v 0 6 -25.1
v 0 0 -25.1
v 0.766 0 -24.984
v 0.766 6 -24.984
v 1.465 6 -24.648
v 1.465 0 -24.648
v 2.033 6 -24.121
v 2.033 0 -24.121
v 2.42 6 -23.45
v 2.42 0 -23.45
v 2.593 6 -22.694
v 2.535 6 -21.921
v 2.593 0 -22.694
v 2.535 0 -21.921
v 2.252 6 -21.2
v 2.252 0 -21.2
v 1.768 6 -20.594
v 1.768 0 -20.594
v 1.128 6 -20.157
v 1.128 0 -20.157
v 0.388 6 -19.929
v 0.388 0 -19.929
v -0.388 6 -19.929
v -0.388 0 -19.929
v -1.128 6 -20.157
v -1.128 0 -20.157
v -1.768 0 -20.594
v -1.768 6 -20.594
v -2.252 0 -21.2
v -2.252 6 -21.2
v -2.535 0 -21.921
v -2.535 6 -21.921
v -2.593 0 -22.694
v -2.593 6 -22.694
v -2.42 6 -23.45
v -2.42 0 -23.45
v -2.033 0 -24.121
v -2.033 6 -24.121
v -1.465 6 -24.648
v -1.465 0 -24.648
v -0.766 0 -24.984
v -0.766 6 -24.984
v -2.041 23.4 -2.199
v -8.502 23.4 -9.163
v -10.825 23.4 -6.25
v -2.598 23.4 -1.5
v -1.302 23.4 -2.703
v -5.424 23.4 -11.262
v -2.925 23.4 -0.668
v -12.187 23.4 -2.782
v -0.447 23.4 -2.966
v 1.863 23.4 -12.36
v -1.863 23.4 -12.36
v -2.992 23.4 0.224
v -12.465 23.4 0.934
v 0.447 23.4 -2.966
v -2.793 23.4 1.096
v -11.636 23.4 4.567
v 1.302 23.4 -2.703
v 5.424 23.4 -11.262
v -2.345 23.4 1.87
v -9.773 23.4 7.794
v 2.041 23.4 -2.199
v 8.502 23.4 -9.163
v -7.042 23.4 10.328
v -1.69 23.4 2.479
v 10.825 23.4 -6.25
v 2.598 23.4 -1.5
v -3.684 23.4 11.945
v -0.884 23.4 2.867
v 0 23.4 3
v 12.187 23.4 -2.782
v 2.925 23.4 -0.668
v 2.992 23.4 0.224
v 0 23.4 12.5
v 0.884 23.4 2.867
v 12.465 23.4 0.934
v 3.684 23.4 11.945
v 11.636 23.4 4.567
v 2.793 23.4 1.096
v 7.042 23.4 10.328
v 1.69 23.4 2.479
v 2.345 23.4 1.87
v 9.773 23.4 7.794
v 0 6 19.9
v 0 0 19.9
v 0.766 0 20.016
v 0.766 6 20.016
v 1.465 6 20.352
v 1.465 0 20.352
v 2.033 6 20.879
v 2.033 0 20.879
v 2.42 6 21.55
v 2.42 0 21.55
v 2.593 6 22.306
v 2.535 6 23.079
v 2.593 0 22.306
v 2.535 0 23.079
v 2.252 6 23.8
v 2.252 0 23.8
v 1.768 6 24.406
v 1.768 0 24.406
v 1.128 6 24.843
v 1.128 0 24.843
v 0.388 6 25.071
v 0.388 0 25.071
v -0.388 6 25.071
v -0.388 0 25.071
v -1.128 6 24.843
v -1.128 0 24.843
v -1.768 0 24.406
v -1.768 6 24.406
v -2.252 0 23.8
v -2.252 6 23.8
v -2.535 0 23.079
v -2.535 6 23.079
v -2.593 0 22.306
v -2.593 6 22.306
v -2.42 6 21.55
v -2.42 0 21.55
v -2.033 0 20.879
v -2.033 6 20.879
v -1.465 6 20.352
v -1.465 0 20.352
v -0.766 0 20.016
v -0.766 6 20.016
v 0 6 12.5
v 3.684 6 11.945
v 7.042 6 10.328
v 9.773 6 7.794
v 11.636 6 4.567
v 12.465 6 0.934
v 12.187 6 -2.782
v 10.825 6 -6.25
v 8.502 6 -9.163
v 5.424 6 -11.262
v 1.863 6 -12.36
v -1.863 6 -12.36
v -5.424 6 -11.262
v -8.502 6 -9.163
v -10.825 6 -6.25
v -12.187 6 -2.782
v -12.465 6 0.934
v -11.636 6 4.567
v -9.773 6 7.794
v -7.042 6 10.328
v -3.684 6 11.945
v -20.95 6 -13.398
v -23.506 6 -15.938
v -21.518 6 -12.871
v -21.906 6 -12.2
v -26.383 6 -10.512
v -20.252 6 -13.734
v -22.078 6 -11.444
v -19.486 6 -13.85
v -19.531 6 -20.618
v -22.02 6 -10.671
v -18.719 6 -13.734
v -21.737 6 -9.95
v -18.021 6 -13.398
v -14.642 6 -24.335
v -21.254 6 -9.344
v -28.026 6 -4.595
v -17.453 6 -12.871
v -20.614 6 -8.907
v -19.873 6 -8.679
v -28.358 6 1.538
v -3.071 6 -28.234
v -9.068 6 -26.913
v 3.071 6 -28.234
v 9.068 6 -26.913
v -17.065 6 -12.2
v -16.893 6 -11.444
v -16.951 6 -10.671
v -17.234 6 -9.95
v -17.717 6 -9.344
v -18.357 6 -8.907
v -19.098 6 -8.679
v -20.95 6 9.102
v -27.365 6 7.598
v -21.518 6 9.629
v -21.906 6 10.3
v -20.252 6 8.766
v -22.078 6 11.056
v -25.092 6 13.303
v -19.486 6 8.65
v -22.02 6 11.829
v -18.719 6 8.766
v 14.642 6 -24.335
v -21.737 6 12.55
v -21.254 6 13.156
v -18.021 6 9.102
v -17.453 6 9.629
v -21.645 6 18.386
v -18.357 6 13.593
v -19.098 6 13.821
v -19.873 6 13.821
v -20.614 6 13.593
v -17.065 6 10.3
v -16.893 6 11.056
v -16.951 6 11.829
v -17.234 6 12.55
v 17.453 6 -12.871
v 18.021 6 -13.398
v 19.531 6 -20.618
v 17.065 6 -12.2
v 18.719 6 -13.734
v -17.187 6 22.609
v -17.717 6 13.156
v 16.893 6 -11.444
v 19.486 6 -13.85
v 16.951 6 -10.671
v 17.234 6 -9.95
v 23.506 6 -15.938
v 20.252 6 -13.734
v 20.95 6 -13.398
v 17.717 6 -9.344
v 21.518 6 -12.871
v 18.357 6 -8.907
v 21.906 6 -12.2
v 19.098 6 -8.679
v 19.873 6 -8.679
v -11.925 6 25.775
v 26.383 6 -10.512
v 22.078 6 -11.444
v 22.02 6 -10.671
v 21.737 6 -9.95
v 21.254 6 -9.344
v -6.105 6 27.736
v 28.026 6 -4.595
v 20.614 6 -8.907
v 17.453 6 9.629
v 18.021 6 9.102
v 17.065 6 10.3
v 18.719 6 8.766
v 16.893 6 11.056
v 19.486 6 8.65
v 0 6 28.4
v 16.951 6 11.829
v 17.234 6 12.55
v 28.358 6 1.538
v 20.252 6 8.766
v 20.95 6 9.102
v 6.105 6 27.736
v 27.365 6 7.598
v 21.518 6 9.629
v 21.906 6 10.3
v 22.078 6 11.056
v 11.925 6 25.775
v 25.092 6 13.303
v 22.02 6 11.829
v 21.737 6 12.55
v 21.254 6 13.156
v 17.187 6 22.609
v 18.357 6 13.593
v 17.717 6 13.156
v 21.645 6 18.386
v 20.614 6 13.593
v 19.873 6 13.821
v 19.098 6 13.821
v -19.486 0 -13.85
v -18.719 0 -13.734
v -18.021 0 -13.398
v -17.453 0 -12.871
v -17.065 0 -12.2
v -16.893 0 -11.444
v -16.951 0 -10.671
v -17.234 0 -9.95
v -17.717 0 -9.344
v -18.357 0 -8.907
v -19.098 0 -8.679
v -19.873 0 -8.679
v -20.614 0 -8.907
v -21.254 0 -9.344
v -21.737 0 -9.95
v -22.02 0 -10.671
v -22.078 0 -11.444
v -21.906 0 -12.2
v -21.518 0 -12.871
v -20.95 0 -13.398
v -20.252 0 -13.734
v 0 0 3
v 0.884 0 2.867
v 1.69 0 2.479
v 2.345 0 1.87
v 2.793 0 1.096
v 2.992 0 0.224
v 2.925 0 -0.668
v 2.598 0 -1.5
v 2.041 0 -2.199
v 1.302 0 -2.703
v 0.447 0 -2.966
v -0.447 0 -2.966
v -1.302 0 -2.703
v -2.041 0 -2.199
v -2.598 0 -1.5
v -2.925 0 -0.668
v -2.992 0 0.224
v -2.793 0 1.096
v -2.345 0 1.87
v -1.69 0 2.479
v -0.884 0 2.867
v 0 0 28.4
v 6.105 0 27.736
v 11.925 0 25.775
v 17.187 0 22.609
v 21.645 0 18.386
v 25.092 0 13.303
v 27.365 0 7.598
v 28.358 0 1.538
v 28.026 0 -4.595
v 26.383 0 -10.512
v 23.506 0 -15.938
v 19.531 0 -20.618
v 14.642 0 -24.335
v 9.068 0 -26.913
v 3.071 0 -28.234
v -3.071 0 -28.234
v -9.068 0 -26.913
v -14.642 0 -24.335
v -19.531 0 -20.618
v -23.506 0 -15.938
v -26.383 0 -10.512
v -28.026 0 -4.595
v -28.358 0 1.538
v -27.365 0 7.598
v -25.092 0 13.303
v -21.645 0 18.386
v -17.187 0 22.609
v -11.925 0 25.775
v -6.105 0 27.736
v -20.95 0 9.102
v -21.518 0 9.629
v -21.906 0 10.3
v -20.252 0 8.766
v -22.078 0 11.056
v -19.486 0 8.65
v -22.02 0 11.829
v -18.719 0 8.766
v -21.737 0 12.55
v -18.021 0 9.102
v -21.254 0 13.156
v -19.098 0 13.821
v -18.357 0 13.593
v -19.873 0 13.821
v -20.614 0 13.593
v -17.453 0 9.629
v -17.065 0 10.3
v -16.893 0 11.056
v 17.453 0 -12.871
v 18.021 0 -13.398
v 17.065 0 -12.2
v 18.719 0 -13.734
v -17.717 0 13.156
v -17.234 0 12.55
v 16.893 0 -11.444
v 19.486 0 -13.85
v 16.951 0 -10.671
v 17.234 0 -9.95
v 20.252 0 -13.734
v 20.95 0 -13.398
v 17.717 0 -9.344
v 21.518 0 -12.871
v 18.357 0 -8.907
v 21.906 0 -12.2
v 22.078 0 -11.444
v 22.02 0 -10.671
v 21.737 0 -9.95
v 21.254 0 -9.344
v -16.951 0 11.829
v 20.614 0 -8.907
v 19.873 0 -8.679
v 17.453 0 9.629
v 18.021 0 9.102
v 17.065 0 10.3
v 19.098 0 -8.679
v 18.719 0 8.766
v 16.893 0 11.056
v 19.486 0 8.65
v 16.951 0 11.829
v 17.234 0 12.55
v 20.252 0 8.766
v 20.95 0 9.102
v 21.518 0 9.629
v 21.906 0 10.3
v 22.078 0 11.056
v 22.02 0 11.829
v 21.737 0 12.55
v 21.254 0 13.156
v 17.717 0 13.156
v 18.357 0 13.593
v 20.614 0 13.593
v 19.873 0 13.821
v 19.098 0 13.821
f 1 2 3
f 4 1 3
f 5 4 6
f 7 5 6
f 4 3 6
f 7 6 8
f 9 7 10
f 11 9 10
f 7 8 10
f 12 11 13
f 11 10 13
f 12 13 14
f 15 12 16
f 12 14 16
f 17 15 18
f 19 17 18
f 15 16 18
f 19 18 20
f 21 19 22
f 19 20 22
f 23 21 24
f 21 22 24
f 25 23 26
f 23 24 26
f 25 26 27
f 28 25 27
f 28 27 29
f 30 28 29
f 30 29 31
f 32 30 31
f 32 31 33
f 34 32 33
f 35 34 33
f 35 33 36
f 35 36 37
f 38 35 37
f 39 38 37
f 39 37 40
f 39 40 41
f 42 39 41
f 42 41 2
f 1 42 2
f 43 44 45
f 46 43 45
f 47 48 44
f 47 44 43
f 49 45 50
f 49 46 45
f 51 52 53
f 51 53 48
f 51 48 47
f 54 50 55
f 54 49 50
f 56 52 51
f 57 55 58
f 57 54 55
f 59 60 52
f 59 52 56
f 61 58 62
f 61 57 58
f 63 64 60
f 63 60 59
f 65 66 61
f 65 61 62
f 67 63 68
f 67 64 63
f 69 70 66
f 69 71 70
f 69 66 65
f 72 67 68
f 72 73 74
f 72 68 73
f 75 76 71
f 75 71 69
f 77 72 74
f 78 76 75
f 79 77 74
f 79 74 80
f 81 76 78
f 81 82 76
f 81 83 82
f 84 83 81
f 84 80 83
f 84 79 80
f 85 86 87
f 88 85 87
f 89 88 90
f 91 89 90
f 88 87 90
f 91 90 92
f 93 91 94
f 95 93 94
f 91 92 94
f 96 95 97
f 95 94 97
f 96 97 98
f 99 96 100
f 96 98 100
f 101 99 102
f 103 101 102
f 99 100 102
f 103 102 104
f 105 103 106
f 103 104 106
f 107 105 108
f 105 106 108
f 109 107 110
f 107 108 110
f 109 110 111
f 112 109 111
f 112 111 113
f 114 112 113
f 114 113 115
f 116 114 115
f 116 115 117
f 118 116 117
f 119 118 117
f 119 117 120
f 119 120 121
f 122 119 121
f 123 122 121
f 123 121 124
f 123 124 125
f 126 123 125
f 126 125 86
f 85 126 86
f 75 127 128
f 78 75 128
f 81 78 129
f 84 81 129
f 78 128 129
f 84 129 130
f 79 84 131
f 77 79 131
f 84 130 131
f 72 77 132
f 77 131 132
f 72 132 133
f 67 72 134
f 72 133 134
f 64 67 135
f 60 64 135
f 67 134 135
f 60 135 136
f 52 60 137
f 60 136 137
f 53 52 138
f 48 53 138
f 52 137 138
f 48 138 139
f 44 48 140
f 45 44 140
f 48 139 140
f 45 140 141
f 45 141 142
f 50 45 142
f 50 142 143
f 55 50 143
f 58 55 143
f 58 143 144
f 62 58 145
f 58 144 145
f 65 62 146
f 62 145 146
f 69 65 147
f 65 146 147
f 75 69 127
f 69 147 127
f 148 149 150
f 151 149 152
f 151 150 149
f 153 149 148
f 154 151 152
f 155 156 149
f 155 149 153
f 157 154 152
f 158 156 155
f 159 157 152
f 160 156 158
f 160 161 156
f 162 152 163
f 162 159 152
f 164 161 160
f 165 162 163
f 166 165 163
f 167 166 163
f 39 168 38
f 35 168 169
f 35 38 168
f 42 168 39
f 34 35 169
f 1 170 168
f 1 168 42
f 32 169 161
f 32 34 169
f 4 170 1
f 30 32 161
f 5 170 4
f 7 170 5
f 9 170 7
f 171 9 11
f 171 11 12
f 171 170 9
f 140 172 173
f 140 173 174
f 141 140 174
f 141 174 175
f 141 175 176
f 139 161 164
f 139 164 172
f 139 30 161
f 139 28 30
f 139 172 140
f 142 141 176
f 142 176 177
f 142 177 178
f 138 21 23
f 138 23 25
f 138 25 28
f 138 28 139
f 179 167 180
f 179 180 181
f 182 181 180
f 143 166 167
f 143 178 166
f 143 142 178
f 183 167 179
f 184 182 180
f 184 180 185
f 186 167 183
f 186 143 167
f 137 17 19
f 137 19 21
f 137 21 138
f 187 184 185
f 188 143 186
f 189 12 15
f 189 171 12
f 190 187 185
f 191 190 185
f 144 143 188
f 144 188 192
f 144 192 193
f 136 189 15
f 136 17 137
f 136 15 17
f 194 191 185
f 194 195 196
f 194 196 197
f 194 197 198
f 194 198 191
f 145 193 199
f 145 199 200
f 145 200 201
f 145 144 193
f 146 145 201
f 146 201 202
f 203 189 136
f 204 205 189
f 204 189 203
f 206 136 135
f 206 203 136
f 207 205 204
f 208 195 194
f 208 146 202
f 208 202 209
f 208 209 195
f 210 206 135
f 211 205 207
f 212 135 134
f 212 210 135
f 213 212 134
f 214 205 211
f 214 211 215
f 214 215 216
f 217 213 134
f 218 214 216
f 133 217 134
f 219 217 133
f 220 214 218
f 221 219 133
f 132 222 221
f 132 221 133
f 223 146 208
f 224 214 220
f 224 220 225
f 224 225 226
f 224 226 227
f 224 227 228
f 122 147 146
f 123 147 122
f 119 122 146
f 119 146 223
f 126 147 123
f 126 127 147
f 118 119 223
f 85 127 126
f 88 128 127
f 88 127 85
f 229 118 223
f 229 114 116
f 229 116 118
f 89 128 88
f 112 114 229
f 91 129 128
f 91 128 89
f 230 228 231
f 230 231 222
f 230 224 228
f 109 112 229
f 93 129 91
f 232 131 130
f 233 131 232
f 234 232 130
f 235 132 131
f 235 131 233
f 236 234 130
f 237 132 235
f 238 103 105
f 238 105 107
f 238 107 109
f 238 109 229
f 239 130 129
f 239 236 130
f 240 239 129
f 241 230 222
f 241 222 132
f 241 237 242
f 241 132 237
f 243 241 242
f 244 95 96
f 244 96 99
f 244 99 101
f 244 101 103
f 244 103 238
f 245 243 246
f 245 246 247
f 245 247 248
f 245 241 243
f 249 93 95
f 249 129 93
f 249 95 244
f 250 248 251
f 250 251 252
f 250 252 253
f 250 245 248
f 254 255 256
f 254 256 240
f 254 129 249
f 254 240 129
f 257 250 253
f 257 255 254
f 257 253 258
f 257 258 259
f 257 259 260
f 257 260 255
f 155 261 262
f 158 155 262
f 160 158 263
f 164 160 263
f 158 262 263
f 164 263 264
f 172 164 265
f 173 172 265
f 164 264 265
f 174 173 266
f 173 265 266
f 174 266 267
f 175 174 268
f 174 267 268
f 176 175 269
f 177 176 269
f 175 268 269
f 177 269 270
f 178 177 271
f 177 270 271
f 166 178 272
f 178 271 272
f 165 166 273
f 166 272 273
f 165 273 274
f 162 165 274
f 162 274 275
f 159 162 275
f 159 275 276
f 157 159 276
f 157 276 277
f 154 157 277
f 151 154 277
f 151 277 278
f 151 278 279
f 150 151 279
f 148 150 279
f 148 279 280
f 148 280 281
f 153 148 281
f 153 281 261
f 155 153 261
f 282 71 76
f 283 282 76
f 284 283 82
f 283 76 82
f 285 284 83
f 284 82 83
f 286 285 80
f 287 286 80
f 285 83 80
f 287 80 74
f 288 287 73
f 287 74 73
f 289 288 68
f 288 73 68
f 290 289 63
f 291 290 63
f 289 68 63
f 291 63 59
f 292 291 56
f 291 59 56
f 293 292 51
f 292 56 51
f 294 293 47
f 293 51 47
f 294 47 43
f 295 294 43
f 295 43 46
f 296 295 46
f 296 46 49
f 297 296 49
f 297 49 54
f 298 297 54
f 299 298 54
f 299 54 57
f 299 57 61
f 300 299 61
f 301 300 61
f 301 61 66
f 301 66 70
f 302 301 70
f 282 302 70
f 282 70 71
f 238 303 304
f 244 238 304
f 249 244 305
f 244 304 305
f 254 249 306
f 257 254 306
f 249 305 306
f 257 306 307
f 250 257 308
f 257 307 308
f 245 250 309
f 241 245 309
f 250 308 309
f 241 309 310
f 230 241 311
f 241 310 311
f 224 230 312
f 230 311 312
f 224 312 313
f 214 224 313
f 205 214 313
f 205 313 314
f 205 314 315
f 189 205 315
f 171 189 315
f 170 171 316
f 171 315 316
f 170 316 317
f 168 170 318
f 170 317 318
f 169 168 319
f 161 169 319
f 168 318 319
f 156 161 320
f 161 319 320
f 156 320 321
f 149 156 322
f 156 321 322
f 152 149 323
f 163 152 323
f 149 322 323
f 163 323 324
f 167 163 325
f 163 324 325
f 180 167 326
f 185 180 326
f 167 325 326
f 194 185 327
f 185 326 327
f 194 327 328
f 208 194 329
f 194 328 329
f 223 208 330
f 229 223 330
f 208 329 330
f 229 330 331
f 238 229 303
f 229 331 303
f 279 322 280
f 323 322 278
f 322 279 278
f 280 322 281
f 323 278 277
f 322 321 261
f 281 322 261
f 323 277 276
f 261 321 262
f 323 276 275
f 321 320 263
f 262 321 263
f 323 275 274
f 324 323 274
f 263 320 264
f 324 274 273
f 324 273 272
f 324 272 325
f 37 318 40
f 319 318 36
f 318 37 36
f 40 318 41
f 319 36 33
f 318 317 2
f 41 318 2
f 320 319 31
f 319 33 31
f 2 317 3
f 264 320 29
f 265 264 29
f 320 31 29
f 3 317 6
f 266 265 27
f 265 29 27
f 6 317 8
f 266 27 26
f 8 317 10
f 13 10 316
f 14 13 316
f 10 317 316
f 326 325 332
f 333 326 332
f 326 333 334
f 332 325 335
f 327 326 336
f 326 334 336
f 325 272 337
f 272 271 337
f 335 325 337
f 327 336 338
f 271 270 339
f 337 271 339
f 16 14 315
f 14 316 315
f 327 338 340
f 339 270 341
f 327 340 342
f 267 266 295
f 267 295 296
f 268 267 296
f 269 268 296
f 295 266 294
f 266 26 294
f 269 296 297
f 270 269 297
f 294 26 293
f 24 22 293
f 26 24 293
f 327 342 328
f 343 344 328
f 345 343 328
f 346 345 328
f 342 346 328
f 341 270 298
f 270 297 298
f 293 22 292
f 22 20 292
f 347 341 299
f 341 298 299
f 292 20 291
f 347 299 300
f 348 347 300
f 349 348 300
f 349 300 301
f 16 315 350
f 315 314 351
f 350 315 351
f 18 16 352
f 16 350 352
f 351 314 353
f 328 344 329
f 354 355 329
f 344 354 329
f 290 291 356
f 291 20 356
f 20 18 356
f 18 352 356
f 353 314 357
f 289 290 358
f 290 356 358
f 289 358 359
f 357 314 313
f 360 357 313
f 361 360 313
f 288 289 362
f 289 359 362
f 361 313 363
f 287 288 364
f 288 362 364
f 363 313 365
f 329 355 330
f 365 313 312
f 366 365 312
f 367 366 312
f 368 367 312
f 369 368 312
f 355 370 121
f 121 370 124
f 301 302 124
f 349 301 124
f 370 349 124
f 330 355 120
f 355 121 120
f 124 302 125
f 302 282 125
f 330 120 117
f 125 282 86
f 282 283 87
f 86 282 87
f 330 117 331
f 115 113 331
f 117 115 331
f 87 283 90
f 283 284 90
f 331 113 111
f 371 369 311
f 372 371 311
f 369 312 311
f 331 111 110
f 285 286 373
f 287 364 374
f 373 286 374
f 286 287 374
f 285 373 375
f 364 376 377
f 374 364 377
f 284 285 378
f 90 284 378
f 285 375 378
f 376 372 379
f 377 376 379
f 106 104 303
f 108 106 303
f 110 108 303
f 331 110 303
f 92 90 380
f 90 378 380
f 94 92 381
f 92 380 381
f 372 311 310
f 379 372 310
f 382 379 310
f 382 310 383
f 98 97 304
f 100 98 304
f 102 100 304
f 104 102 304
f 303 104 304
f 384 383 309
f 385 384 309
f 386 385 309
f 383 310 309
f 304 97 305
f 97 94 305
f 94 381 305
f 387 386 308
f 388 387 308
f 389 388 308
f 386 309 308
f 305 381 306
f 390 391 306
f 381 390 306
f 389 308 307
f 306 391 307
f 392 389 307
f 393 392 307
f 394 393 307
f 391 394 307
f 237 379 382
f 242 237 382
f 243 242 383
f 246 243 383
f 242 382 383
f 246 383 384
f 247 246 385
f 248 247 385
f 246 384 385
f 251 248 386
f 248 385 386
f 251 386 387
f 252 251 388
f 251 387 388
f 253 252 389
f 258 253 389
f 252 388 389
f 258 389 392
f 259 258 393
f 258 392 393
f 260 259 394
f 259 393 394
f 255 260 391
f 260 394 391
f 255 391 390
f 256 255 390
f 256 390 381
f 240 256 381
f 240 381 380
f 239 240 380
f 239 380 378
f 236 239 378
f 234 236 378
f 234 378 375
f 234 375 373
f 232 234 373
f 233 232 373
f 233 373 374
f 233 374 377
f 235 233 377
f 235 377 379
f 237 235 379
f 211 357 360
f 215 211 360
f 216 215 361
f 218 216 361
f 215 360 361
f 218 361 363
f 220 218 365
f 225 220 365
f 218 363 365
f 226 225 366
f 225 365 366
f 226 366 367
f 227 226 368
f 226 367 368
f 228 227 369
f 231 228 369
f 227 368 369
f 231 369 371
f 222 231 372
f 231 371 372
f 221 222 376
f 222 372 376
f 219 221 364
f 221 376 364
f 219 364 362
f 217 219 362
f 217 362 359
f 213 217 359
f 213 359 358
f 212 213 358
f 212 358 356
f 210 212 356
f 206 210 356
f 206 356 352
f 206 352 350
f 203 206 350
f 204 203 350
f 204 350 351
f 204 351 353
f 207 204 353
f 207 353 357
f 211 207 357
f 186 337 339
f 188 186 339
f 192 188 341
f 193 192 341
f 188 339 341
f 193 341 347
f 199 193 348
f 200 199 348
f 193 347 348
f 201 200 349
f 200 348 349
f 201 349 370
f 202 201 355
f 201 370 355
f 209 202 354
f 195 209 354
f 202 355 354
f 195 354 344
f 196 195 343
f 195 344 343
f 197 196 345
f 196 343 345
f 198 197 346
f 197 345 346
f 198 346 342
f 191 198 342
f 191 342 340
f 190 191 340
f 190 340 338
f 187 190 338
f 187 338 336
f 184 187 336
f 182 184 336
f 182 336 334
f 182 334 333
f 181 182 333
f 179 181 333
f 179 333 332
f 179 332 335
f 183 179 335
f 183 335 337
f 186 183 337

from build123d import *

# Parameters (mm, degrees)
SKETCH_1_R          = 28.4
EXTRUDE_1_DEPTH     = 6
SKETCH_2_R          = 12.5
EXTRUDE_2_DEPTH     = 17.4
SKETCH_3_R          = 3
CUT_EXTRUDE_1_DEPTH = 60
SKETCH_4_R          = 2.6
CUT_EXTRUDE_2_DEPTH = 10


with BuildPart() as part:
    # 草图1 → 凸台-拉伸1 (new body)
    with BuildSketch(Plane(origin=(0, 0, 0), x_dir=(1, 0, 0), z_dir=(0, 1, 0))):
        with Locations(Location((0, 0, 0), (0, 0, 270))):
            Circle(SKETCH_1_R)
    extrude(amount=EXTRUDE_1_DEPTH)

    # 草图2 → 凸台-拉伸2 (add)
    with BuildSketch(Plane(origin=(0, 6, 0), x_dir=(1, 0, 0), z_dir=(0, 1, 0))):
        with Locations(Location((0, 0, 0), (0, 0, 270))):
            Circle(SKETCH_2_R)
    extrude(amount=EXTRUDE_2_DEPTH)

    # 草图3 → 切除-拉伸1 (cut)
    with BuildSketch(Plane(origin=(0, 23.4, 0), x_dir=(1, 0, 0), z_dir=(0, 1, 0))):
        with Locations(Location((0, 0, 0), (0, 0, 270))):
            Circle(SKETCH_3_R)
    extrude(amount=-CUT_EXTRUDE_1_DEPTH, mode=Mode.SUBTRACT)

    # 草图4 → 切除-拉伸2 (cut)
    with BuildSketch(Plane.XZ):
        with Locations(Location((0, 22.5, 0), (0, 0, 270))):
            Circle(SKETCH_4_R)
        with Locations(Location((19.485571585, 11.25, 0), (0, 0, 270))):
            Circle(SKETCH_4_R)
        with Locations(Location((19.485571585, -11.25, 0), (0, 0, 270))):
            Circle(SKETCH_4_R)
        with Locations(Location((0, -22.5, 0), (0, 0, 270))):
            Circle(SKETCH_4_R)
        with Locations(Location((-19.485571585, -11.25, 0), (0, 0, 270))):
            Circle(SKETCH_4_R)
        with Locations(Location((-19.485571585, 11.25, 0), (0, 0, 270))):
            Circle(SKETCH_4_R)
    extrude(amount=-CUT_EXTRUDE_2_DEPTH, mode=Mode.SUBTRACT)


solid = part.part
